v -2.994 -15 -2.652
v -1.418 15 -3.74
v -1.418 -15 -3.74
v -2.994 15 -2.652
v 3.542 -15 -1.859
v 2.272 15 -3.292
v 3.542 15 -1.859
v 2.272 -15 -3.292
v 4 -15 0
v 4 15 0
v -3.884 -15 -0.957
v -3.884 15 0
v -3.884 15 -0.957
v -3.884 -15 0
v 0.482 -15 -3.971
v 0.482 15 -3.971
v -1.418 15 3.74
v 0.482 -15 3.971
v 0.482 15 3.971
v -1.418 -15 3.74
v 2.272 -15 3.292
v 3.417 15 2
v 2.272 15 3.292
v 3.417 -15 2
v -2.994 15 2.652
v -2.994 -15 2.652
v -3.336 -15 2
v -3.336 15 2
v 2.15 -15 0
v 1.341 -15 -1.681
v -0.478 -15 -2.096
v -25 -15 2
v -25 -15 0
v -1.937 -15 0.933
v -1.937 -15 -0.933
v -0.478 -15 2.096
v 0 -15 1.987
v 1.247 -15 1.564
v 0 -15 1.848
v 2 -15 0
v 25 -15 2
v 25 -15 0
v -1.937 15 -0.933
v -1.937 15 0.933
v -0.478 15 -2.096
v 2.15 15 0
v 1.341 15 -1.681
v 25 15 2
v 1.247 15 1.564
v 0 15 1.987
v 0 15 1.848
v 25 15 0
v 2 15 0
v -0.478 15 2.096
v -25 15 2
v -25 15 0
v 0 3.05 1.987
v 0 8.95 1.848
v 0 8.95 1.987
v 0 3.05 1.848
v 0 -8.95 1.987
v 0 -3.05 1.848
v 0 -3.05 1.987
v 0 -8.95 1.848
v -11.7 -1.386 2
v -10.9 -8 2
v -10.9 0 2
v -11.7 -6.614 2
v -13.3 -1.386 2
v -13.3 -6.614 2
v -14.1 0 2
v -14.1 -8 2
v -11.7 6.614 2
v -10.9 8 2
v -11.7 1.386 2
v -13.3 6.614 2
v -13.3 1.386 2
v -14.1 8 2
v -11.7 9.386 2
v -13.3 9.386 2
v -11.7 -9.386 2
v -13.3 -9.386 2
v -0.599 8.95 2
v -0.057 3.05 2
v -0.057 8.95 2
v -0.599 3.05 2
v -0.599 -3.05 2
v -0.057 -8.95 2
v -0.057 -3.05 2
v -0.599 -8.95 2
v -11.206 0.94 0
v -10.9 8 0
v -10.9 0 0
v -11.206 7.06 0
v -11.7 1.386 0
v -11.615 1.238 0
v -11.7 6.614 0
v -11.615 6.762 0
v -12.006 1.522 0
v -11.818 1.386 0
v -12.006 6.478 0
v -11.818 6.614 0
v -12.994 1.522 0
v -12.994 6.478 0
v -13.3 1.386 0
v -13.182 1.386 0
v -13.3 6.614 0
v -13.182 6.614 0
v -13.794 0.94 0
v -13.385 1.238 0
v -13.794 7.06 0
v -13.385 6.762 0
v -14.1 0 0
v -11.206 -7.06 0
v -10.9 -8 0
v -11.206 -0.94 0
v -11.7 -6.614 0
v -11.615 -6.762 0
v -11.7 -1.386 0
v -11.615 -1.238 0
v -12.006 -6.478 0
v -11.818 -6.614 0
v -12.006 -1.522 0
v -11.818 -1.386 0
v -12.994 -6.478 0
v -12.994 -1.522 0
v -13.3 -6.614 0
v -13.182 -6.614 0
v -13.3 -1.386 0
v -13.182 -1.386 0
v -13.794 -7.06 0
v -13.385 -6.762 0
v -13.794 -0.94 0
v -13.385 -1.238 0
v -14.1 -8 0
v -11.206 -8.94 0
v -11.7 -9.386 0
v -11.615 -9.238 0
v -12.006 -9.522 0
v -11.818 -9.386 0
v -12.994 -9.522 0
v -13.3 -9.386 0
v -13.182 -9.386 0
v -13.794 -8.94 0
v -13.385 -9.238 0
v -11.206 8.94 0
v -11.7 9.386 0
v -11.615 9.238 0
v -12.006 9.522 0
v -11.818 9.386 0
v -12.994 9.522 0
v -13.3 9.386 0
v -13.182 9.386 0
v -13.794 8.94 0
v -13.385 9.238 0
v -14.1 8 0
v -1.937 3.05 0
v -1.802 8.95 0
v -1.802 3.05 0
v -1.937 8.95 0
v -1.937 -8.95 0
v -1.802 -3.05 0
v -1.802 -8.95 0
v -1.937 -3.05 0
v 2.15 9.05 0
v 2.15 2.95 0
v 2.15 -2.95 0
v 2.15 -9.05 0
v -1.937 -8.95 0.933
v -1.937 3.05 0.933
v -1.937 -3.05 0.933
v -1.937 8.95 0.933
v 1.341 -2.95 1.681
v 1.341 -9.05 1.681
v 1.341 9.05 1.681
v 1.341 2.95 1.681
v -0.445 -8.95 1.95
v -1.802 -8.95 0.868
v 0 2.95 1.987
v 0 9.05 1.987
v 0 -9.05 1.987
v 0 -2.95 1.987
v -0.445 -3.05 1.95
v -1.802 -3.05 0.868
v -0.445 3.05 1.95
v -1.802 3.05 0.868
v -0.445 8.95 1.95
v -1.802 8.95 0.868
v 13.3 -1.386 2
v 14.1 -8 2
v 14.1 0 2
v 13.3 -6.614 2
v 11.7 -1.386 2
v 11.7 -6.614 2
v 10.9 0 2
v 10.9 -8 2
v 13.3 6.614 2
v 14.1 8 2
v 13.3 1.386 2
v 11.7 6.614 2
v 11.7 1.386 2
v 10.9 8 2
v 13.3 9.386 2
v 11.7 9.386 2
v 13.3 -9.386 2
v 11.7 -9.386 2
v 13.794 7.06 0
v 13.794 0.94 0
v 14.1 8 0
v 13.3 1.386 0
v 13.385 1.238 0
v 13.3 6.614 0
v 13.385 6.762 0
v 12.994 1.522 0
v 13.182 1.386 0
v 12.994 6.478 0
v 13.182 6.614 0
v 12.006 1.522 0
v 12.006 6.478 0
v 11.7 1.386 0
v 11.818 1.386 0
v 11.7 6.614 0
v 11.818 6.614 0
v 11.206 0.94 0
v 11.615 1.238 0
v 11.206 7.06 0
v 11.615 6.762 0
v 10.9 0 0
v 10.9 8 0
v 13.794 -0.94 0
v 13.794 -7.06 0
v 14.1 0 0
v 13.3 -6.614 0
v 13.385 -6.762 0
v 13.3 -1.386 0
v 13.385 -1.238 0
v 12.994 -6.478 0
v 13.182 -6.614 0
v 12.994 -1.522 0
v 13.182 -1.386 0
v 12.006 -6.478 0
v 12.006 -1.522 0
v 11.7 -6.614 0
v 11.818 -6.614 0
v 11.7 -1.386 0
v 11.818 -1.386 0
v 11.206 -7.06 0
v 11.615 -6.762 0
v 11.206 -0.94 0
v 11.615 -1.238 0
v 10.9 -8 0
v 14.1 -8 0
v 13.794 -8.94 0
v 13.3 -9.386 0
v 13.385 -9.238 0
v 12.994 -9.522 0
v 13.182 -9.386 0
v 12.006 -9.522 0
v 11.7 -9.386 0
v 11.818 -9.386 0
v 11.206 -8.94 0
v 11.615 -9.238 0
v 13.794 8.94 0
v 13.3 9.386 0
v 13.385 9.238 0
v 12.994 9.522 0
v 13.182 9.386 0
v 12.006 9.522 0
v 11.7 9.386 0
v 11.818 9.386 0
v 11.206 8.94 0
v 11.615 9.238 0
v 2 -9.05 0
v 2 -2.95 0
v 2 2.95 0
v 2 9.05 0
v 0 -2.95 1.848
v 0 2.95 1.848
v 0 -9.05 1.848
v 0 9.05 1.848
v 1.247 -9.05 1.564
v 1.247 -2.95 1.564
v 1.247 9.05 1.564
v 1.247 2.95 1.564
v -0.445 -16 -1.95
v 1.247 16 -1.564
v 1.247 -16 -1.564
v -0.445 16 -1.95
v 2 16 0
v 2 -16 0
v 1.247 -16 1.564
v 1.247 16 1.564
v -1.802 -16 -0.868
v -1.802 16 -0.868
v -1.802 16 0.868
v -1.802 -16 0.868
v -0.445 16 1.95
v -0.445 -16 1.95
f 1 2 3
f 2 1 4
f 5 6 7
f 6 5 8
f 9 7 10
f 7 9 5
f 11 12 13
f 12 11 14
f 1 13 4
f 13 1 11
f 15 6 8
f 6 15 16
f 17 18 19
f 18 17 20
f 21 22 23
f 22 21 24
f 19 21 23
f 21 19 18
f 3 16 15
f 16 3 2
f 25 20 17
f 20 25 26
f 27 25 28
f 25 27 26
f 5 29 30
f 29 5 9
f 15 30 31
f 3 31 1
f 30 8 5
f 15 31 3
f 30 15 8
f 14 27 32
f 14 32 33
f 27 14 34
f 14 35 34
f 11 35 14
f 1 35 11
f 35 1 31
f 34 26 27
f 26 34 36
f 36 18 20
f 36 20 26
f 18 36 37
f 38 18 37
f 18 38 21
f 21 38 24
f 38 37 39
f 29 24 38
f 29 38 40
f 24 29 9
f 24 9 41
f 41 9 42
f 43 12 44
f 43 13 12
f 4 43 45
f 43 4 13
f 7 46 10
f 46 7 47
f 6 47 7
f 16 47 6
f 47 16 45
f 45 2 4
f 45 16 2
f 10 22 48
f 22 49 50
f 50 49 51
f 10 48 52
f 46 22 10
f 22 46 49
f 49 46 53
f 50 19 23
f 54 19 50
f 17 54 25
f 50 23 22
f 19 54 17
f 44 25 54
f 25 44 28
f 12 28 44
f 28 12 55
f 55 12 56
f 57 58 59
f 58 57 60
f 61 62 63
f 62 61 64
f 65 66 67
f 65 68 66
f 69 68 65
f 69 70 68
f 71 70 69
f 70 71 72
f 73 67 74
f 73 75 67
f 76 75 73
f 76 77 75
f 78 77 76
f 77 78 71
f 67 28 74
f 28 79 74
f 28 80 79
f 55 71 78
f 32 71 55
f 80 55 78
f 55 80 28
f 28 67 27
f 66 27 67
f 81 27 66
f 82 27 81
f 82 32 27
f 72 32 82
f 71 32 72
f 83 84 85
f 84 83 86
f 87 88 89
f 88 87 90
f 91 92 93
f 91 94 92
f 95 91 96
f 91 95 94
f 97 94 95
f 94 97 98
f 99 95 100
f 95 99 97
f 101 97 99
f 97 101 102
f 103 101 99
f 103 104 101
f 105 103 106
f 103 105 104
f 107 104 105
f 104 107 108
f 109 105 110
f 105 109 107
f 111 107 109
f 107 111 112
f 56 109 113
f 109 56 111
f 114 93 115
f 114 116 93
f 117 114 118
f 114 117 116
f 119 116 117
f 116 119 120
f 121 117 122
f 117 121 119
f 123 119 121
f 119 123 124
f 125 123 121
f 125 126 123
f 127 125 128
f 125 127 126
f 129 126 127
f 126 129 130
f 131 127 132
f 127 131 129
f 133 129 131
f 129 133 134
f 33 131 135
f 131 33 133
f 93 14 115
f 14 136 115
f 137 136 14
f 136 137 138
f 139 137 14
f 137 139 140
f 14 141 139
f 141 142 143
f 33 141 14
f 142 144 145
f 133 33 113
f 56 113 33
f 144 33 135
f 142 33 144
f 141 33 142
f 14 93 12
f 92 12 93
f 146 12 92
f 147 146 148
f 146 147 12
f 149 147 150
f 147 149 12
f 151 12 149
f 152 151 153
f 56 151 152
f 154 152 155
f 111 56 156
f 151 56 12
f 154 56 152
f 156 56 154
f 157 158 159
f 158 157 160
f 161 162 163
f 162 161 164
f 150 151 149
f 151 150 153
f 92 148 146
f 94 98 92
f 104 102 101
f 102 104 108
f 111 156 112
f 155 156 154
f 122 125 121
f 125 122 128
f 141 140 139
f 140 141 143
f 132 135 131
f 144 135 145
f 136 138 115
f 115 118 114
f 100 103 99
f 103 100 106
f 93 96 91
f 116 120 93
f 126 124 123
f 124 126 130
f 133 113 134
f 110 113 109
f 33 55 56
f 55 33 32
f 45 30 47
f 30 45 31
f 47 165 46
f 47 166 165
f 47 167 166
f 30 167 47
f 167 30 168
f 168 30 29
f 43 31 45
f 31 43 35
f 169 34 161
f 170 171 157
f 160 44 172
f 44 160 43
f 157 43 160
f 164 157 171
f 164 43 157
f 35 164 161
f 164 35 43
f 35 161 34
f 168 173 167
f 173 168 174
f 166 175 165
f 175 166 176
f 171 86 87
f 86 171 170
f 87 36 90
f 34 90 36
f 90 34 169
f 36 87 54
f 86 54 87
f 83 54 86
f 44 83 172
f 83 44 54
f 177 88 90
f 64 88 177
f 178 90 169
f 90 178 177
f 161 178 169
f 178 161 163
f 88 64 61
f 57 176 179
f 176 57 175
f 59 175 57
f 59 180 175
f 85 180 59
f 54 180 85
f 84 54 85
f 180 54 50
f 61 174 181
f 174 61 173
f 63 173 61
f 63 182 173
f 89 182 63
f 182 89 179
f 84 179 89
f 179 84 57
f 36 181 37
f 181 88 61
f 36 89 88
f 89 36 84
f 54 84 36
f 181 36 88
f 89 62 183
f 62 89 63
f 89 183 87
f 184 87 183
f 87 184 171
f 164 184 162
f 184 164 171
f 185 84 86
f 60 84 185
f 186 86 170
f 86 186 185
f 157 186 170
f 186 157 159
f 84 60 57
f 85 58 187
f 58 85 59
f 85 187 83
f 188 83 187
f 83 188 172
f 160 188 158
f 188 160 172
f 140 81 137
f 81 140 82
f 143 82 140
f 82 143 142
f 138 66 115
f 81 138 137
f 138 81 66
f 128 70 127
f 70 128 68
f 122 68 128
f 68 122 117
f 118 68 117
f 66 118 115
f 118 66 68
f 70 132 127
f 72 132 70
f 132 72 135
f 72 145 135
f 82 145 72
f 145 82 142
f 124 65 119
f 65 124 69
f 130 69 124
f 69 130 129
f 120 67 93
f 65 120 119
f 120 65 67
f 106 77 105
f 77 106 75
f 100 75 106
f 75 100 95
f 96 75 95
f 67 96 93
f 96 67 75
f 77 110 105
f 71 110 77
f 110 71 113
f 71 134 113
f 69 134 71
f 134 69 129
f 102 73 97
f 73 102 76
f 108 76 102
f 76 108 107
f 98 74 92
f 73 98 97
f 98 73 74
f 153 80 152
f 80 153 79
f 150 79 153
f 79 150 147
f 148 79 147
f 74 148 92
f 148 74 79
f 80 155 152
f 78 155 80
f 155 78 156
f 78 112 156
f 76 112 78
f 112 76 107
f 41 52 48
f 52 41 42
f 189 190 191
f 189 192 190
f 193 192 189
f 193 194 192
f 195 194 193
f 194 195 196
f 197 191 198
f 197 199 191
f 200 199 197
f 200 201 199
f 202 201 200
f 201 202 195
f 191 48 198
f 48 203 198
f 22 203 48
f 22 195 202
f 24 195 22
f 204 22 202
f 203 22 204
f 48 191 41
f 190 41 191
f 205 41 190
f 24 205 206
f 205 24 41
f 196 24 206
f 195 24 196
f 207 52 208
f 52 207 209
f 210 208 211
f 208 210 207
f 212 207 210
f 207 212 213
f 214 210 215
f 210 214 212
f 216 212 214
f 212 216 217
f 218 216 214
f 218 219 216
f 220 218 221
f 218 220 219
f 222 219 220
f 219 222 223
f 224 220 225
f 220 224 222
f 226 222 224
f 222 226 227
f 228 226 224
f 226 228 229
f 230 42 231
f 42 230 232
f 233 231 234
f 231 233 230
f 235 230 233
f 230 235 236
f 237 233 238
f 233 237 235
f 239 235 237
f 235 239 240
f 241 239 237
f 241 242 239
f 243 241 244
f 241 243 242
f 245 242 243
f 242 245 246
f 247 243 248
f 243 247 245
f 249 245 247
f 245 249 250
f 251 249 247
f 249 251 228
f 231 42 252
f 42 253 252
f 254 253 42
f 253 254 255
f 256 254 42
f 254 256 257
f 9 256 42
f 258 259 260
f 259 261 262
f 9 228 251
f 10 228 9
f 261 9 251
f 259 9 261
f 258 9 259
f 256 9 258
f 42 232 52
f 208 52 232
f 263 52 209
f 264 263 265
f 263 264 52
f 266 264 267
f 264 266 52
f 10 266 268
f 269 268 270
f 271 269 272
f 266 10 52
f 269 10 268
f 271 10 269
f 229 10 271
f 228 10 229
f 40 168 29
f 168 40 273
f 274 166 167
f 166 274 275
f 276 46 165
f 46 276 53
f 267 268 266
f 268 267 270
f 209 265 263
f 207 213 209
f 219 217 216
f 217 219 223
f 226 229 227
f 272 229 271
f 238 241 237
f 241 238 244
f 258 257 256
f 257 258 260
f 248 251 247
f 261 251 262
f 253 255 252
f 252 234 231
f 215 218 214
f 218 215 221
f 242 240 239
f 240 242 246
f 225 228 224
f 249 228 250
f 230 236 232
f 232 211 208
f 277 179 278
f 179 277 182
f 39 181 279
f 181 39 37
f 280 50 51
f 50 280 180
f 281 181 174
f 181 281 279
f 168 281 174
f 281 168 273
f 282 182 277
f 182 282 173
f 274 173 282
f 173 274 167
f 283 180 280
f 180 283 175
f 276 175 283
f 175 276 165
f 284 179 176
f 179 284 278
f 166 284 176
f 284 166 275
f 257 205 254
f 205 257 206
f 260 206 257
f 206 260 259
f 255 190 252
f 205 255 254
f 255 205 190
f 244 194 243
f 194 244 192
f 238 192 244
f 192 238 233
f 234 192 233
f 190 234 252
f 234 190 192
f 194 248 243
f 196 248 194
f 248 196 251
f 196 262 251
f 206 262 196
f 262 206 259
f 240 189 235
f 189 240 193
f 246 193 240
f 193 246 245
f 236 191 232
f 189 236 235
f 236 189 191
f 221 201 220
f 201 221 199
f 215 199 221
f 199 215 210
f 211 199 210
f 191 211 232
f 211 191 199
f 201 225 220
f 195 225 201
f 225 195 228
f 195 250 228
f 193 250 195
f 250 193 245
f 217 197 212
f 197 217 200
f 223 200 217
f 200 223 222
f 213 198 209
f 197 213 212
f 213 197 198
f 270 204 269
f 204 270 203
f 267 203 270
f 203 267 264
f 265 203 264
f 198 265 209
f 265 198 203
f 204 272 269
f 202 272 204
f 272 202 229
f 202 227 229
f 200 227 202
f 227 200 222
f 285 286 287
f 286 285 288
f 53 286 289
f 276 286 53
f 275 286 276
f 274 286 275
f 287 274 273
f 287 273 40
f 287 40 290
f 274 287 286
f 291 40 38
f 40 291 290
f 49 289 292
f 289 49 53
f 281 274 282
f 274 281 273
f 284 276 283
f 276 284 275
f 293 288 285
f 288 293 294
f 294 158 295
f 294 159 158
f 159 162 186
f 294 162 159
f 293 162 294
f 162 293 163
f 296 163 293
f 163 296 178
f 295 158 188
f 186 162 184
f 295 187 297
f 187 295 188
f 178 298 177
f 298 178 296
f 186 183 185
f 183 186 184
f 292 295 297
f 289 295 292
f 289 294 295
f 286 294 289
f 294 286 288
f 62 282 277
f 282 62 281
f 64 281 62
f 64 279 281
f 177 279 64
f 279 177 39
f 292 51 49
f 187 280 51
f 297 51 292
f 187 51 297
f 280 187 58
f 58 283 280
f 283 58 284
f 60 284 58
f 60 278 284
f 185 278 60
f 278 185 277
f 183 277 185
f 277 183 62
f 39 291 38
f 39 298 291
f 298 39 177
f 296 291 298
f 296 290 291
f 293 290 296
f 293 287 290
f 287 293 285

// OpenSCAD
// パラメータ設定
leaf_w = 25;
leaf_h = 30;
leaf_t = 2;
pin_dia = 4;
clearance = 0.3;
hole_dia = 3.2;
knuckle_od = 8;
knuckle_id = pin_dia + clearance;
knuckle_h = 6;
num_segments = 5;

// メインモデル
union() {
    // 左板
    color("silver")
    difference() {
        union() {
            translate([-leaf_w, -leaf_h/2, 0]) cube([leaf_w, leaf_h, leaf_t]);
            // Knuckle (左板: 外側2個 + 中央1個 -> 0, 2, 4番目)
            for (i = [0, 2, 4]) {
                translate([0, -leaf_h/2 + i * knuckle_h + knuckle_h/2, 0])
                rotate([-90, 0, 0])
                cylinder(d = knuckle_od, h = knuckle_h, center = true);
            }
        }
        // 貫通穴
        for (i = [0, 2, 4]) {
            translate([0, -leaf_h/2 + i * knuckle_h + knuckle_h/2, 0])
            rotate([-90, 0, 0])
            cylinder(d = knuckle_id, h = knuckle_h + 0.1, center = true);
        }
        // 皿穴と貫通穴 (左板)
        for (i = [-1, 0, 1]) {
            translate([-leaf_w/2, i * 8, -1]) {
                cylinder(d = 3.2, h = 4);
                cylinder(d1 = 6, d2 = 3.2, h = 1);
            }
        }
    }

    // 右板
    color("gray")
    difference() {
        union() {
            translate([0, -leaf_h/2, 0]) cube([leaf_w, leaf_h, leaf_t]);
            // Knuckle (右板: 中間2個 -> 1, 3番目)
            for (i = [1, 3]) {
                translate([0, -leaf_h/2 + i * knuckle_h + knuckle_h/2, 0])
                rotate([-90, 0, 0])
                cylinder(d = knuckle_od, h = knuckle_h, center = true);
            }
        }
        // 貫通穴
        for (i = [1, 3]) {
            translate([0, -leaf_h/2 + i * knuckle_h + knuckle_h/2, 0])
            rotate([-90, 0, 0])
            cylinder(d = knuckle_id, h = knuckle_h + 0.1, center = true);
        }
        // 皿穴と貫通穴 (右板)
        for (i = [-1, 0, 1]) {
            translate([leaf_w/2, i * 8, -1]) {
                cylinder(d = 3.2, h = 4);
                cylinder(d1 = 6, d2 = 3.2, h = 1);
            }
        }
    }

    // ピン軸
    color("lightgray")
    translate([0, 0, 0])
    rotate([-90, 0, 0])
    cylinder(d = pin_dia, h = 32, center = true);
}
